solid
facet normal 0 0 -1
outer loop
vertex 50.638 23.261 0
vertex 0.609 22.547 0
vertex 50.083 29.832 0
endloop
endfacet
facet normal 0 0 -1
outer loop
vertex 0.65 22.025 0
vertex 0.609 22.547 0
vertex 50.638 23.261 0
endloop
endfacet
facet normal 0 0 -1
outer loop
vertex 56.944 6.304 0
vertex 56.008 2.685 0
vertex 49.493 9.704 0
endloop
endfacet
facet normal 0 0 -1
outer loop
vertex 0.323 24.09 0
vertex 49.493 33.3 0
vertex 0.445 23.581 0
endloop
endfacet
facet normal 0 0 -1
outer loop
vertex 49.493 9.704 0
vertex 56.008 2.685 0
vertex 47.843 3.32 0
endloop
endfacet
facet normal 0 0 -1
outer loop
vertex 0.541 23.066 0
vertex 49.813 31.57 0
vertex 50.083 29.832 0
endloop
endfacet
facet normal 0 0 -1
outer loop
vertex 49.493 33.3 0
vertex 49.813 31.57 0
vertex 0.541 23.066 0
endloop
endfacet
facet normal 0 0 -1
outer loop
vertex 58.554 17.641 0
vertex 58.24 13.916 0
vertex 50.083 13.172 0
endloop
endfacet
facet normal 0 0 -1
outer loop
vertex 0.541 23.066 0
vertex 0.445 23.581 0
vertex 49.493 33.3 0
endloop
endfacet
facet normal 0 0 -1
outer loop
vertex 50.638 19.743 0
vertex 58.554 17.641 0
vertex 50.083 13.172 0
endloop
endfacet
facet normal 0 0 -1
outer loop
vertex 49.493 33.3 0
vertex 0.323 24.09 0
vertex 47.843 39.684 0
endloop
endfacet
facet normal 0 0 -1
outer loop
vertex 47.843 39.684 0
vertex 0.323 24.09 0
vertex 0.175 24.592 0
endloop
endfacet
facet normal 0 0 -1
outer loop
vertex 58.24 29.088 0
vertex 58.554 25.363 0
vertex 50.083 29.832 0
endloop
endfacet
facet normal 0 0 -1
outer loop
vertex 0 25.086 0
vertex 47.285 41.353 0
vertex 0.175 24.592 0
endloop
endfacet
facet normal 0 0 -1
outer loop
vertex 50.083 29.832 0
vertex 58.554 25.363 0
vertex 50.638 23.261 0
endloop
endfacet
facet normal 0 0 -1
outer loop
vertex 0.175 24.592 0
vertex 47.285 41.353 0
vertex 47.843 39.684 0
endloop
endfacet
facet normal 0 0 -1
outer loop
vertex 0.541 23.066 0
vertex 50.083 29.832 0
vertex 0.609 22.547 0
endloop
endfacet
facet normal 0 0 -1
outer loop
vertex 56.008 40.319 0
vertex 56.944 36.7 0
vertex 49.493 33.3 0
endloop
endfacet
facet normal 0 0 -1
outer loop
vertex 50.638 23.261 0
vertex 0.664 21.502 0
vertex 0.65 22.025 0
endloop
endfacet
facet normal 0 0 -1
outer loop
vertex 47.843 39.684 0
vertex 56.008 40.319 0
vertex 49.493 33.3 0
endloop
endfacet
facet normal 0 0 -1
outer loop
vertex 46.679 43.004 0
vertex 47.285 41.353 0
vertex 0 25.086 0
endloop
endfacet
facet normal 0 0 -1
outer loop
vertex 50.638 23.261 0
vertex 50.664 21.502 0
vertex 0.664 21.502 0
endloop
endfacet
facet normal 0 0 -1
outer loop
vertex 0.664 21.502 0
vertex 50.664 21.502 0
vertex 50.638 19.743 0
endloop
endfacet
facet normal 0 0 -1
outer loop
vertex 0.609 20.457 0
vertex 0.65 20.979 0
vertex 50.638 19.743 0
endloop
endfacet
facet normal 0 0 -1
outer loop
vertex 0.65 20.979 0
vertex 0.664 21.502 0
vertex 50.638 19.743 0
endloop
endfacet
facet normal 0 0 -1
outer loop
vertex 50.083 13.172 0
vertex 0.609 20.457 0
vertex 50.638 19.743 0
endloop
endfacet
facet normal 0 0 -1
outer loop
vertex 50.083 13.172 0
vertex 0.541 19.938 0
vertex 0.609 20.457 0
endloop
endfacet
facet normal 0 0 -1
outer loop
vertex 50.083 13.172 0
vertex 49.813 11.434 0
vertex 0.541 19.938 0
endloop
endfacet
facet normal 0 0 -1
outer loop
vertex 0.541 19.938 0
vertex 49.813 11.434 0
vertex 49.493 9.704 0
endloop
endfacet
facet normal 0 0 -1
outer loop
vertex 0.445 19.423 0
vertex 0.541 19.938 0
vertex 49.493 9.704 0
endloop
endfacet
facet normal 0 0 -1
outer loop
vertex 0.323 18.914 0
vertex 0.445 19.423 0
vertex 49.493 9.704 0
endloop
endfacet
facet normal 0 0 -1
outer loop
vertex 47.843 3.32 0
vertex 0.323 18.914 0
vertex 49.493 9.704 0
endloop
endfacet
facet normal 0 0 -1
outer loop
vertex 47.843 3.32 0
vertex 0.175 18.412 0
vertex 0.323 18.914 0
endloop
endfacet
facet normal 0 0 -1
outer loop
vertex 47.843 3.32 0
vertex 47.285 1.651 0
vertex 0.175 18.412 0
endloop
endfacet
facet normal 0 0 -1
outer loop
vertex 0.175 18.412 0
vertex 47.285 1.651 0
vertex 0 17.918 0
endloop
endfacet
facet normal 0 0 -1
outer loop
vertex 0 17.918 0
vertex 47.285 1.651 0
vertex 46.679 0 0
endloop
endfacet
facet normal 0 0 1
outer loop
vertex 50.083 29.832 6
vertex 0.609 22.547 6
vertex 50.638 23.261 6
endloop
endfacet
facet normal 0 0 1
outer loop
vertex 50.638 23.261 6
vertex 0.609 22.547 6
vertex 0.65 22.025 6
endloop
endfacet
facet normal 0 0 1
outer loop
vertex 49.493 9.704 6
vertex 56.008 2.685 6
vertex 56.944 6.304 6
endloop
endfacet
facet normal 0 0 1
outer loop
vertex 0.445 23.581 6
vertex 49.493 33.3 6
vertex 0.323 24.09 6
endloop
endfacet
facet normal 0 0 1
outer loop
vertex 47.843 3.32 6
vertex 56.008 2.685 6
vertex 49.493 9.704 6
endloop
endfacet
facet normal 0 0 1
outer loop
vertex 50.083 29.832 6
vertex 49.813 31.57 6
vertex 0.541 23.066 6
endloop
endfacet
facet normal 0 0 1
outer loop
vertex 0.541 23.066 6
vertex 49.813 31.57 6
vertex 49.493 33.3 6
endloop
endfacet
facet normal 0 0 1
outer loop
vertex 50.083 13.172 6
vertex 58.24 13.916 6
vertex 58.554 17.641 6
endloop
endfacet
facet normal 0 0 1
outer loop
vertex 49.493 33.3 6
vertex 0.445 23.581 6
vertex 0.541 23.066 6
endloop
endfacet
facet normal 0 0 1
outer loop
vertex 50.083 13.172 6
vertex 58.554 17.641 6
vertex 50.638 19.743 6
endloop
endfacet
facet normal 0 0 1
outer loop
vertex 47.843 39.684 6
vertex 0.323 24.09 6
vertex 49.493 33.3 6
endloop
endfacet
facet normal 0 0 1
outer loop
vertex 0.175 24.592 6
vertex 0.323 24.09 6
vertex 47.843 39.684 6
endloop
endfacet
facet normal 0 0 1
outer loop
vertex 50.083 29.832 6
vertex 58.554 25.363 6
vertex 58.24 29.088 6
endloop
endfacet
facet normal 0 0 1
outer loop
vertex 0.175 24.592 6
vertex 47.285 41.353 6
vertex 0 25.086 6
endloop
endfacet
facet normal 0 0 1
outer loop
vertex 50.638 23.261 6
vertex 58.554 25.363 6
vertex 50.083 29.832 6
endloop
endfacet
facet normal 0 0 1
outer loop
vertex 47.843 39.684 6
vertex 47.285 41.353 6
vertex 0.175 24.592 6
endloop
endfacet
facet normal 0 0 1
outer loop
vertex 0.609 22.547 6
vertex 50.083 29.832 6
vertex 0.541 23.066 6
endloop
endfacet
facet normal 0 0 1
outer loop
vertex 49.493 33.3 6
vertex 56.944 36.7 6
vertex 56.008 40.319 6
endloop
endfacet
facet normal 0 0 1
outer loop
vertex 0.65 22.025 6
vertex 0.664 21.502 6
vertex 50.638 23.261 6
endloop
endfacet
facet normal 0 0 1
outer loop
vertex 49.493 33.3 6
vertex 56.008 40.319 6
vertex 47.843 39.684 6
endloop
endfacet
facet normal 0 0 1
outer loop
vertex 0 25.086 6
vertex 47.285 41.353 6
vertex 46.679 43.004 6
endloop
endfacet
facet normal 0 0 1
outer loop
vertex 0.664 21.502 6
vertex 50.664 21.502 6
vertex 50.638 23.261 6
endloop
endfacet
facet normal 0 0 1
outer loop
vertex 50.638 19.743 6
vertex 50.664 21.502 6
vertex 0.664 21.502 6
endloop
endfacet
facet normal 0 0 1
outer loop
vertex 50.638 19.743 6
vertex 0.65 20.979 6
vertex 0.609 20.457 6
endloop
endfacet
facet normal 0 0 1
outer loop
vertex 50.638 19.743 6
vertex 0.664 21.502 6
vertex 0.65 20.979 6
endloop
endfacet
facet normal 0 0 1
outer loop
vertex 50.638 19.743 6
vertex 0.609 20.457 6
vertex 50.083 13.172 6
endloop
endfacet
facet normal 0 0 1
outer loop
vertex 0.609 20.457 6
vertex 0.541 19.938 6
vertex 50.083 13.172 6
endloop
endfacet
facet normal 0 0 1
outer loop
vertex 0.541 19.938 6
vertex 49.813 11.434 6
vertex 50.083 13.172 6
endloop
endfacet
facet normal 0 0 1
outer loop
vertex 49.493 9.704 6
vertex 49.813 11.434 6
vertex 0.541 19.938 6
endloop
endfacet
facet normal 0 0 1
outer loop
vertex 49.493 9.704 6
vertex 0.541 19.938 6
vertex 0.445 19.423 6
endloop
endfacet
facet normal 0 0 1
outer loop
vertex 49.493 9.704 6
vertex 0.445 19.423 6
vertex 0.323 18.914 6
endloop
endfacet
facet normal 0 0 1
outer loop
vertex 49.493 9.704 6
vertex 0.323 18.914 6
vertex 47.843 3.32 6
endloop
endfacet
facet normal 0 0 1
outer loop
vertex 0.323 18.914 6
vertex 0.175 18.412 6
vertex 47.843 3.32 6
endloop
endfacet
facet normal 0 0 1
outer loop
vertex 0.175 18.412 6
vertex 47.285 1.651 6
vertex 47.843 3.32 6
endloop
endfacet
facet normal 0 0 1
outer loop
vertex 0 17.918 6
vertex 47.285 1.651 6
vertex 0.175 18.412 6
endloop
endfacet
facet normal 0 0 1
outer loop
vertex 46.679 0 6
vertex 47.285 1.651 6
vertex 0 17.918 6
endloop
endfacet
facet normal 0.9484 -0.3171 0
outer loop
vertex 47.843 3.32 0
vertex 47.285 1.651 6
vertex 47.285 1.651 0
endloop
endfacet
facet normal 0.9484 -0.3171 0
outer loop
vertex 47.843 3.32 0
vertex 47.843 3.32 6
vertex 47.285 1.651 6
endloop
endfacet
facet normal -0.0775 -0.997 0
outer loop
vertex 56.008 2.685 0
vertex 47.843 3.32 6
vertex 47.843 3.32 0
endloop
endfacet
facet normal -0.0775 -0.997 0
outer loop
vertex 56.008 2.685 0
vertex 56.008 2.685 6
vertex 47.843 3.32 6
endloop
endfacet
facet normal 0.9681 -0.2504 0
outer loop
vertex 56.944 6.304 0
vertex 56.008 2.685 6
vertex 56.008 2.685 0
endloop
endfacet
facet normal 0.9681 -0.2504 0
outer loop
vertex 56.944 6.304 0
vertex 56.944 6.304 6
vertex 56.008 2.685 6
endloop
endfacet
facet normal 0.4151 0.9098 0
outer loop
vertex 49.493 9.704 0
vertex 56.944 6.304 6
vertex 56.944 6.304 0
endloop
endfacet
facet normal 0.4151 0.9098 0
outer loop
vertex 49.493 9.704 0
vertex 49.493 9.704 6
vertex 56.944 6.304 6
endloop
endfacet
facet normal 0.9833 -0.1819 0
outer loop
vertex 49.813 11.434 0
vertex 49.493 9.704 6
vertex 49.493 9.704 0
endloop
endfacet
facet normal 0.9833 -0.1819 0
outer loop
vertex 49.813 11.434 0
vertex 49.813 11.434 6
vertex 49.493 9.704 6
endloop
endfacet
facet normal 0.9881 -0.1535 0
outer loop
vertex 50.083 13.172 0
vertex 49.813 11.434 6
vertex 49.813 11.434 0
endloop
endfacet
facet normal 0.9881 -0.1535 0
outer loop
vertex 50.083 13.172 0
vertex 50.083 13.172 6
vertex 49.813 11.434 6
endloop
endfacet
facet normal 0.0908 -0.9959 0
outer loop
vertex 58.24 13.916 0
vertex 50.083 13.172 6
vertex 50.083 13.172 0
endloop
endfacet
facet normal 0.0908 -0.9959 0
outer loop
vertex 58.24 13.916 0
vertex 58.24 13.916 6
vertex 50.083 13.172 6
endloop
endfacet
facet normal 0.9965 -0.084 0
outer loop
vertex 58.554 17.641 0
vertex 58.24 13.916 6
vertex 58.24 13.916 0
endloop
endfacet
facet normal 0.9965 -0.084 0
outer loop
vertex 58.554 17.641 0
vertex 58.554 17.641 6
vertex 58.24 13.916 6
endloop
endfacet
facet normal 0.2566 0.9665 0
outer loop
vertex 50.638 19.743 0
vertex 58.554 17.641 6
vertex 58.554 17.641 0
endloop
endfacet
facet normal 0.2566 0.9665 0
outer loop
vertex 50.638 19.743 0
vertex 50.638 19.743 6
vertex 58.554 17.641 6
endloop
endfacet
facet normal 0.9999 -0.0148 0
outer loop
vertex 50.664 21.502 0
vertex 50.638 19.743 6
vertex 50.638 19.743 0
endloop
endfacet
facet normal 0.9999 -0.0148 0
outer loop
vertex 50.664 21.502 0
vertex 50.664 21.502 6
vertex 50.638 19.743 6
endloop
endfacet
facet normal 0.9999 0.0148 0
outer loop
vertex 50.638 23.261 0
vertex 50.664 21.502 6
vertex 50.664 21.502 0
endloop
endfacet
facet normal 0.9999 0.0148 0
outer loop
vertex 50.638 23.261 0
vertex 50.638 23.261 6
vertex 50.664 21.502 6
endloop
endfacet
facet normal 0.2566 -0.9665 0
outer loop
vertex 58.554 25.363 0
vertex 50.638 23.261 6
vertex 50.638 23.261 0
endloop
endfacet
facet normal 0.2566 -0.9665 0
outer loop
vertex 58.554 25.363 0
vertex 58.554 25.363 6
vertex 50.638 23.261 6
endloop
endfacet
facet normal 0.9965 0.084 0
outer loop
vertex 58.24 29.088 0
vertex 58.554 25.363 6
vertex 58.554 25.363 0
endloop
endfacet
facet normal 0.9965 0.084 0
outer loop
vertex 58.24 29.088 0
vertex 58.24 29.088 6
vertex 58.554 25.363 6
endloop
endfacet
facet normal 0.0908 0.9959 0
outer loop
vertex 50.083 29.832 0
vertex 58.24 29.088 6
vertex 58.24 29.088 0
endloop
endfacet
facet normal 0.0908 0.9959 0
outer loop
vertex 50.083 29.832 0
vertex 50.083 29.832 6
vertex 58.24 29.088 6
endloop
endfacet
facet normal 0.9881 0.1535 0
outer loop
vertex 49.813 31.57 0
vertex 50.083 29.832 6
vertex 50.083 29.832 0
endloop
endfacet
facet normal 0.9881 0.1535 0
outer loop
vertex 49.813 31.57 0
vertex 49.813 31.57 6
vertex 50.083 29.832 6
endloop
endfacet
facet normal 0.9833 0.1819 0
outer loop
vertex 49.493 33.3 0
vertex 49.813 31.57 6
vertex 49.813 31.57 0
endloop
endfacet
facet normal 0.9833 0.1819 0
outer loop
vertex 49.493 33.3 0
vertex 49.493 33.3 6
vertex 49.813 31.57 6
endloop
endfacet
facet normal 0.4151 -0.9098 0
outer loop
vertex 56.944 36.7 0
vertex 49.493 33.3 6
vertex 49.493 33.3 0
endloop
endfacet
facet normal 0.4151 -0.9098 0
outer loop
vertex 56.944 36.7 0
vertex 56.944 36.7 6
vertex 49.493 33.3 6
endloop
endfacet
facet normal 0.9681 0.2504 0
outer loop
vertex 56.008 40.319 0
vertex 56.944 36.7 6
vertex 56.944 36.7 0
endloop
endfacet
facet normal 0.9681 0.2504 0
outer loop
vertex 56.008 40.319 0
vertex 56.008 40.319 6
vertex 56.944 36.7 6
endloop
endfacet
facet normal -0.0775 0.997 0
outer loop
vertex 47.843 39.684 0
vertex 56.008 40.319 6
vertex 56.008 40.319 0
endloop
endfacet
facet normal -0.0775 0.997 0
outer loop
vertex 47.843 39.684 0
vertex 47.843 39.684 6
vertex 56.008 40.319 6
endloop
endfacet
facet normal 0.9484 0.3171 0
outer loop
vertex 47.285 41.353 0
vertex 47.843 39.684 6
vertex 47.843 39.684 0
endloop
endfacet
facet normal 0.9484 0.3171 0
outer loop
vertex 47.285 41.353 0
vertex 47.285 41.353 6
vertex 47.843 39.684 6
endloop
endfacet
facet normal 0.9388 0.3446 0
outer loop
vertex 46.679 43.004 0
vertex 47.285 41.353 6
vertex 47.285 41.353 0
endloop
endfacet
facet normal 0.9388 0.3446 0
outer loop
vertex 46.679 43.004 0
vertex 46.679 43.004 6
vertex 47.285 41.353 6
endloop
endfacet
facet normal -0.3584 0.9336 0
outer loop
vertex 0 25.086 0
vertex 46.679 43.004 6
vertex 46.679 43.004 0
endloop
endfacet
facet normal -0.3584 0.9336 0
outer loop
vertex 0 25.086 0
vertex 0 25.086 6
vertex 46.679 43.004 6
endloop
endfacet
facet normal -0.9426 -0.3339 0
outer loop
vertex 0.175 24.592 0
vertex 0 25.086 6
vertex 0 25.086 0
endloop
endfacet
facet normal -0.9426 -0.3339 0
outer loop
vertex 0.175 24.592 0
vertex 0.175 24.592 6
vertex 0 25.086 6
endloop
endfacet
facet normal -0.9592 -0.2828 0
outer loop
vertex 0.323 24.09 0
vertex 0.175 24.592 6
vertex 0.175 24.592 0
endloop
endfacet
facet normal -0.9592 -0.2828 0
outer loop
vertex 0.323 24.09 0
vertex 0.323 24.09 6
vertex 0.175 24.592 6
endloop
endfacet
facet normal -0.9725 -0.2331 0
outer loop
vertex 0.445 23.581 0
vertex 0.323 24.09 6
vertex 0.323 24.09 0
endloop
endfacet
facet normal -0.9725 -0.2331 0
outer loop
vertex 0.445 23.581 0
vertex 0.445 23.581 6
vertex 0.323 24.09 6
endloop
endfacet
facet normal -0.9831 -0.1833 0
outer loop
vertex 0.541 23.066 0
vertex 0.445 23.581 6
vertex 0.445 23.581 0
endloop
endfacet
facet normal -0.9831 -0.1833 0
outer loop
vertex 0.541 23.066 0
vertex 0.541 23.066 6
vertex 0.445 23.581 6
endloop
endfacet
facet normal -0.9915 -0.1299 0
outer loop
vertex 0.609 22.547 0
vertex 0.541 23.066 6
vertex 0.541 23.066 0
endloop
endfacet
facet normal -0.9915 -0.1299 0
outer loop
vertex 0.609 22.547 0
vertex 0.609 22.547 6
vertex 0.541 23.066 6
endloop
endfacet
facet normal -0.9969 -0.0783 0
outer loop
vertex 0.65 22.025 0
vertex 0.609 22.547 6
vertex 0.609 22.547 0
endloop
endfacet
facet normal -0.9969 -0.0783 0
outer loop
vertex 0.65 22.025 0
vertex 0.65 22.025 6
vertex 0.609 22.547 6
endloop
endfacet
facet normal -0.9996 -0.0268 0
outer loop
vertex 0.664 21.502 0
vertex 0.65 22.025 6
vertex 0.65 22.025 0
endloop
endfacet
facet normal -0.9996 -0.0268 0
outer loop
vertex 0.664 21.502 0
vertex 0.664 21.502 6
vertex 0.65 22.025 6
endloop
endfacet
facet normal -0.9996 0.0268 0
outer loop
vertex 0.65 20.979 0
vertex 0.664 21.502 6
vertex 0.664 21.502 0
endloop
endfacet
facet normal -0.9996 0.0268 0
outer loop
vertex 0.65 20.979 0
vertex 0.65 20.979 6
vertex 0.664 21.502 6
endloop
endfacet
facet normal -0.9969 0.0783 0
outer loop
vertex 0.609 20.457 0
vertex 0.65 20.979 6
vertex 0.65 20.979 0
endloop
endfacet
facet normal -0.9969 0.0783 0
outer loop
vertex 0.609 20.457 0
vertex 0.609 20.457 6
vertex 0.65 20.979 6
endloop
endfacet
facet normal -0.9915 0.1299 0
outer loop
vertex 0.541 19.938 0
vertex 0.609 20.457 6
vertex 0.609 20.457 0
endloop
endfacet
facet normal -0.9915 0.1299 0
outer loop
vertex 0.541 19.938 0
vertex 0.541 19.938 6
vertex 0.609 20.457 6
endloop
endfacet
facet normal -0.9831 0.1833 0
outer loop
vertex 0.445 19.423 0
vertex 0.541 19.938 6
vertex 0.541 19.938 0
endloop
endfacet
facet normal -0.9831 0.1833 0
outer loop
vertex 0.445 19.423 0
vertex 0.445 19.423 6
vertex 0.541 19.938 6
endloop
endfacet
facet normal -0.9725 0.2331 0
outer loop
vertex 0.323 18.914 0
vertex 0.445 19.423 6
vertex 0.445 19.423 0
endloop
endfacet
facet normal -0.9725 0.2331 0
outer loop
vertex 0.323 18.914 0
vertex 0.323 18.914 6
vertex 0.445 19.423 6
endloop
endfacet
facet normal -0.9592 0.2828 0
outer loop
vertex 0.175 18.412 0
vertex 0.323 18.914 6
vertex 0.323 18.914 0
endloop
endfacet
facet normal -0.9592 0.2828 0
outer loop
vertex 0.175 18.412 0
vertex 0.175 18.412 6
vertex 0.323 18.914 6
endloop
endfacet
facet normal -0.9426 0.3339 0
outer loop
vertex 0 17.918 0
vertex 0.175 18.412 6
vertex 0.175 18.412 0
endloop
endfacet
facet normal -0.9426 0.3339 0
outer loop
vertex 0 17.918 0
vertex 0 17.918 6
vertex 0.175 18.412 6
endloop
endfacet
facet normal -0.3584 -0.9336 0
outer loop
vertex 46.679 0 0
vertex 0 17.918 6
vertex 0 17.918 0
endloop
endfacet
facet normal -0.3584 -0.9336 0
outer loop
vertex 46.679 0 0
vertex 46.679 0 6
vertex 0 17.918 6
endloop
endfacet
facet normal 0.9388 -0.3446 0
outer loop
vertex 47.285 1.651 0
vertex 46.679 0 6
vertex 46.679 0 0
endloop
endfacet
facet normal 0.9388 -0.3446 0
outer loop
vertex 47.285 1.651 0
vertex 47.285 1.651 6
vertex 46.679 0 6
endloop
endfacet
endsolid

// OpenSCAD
$fn = 32;

// ----------------------------------------------------------------------
// Gear sector: 4 teeth on 42 degrees
// ----------------------------------------------------------------------

// --- parameters (mm) ---
sector_angle = 42;        // sector angle, degrees
root_r = 60;              // root circle radius
tooth_h = 8;              // tooth height over the root circle
teeth = 4;                // number of teeth on the sector
hub_r = 10;               // hub bore radius
plate_t = 6;              // sector thickness, Z
arc_step = 3;             // sampling step of the root/hub arcs, degrees

tip_r = root_r + tooth_h;  // tip circle radius

profile = [[46.679, 0], [47.285, 1.651], [47.843, 3.32], [56.008, 2.685], [56.944, 6.304], [49.493, 9.704], [49.813, 11.434], [50.083, 13.172], [58.24, 13.916], [58.554, 17.641], [50.638, 19.743], [50.664, 21.502], [50.638, 23.261], [58.554, 25.363], [58.24, 29.088], [50.083, 29.832], [49.813, 31.57], [49.493, 33.3], [56.944, 36.7], [56.008, 40.319], [47.843, 39.684], [47.285, 41.353], [46.679, 43.004], [0, 25.086], [0.175, 24.592], [0.323, 24.09], [0.445, 23.581], [0.541, 23.066], [0.609, 22.547], [0.65, 22.025], [0.664, 21.502], [0.65, 20.979], [0.609, 20.457], [0.541, 19.938], [0.445, 19.423], [0.323, 18.914], [0.175, 18.412], [0, 17.918]];  // primary outline, 38 points, counter clockwise

// --- the one profile operation ---
linear_extrude(height = plate_t) polygon(points = profile);
